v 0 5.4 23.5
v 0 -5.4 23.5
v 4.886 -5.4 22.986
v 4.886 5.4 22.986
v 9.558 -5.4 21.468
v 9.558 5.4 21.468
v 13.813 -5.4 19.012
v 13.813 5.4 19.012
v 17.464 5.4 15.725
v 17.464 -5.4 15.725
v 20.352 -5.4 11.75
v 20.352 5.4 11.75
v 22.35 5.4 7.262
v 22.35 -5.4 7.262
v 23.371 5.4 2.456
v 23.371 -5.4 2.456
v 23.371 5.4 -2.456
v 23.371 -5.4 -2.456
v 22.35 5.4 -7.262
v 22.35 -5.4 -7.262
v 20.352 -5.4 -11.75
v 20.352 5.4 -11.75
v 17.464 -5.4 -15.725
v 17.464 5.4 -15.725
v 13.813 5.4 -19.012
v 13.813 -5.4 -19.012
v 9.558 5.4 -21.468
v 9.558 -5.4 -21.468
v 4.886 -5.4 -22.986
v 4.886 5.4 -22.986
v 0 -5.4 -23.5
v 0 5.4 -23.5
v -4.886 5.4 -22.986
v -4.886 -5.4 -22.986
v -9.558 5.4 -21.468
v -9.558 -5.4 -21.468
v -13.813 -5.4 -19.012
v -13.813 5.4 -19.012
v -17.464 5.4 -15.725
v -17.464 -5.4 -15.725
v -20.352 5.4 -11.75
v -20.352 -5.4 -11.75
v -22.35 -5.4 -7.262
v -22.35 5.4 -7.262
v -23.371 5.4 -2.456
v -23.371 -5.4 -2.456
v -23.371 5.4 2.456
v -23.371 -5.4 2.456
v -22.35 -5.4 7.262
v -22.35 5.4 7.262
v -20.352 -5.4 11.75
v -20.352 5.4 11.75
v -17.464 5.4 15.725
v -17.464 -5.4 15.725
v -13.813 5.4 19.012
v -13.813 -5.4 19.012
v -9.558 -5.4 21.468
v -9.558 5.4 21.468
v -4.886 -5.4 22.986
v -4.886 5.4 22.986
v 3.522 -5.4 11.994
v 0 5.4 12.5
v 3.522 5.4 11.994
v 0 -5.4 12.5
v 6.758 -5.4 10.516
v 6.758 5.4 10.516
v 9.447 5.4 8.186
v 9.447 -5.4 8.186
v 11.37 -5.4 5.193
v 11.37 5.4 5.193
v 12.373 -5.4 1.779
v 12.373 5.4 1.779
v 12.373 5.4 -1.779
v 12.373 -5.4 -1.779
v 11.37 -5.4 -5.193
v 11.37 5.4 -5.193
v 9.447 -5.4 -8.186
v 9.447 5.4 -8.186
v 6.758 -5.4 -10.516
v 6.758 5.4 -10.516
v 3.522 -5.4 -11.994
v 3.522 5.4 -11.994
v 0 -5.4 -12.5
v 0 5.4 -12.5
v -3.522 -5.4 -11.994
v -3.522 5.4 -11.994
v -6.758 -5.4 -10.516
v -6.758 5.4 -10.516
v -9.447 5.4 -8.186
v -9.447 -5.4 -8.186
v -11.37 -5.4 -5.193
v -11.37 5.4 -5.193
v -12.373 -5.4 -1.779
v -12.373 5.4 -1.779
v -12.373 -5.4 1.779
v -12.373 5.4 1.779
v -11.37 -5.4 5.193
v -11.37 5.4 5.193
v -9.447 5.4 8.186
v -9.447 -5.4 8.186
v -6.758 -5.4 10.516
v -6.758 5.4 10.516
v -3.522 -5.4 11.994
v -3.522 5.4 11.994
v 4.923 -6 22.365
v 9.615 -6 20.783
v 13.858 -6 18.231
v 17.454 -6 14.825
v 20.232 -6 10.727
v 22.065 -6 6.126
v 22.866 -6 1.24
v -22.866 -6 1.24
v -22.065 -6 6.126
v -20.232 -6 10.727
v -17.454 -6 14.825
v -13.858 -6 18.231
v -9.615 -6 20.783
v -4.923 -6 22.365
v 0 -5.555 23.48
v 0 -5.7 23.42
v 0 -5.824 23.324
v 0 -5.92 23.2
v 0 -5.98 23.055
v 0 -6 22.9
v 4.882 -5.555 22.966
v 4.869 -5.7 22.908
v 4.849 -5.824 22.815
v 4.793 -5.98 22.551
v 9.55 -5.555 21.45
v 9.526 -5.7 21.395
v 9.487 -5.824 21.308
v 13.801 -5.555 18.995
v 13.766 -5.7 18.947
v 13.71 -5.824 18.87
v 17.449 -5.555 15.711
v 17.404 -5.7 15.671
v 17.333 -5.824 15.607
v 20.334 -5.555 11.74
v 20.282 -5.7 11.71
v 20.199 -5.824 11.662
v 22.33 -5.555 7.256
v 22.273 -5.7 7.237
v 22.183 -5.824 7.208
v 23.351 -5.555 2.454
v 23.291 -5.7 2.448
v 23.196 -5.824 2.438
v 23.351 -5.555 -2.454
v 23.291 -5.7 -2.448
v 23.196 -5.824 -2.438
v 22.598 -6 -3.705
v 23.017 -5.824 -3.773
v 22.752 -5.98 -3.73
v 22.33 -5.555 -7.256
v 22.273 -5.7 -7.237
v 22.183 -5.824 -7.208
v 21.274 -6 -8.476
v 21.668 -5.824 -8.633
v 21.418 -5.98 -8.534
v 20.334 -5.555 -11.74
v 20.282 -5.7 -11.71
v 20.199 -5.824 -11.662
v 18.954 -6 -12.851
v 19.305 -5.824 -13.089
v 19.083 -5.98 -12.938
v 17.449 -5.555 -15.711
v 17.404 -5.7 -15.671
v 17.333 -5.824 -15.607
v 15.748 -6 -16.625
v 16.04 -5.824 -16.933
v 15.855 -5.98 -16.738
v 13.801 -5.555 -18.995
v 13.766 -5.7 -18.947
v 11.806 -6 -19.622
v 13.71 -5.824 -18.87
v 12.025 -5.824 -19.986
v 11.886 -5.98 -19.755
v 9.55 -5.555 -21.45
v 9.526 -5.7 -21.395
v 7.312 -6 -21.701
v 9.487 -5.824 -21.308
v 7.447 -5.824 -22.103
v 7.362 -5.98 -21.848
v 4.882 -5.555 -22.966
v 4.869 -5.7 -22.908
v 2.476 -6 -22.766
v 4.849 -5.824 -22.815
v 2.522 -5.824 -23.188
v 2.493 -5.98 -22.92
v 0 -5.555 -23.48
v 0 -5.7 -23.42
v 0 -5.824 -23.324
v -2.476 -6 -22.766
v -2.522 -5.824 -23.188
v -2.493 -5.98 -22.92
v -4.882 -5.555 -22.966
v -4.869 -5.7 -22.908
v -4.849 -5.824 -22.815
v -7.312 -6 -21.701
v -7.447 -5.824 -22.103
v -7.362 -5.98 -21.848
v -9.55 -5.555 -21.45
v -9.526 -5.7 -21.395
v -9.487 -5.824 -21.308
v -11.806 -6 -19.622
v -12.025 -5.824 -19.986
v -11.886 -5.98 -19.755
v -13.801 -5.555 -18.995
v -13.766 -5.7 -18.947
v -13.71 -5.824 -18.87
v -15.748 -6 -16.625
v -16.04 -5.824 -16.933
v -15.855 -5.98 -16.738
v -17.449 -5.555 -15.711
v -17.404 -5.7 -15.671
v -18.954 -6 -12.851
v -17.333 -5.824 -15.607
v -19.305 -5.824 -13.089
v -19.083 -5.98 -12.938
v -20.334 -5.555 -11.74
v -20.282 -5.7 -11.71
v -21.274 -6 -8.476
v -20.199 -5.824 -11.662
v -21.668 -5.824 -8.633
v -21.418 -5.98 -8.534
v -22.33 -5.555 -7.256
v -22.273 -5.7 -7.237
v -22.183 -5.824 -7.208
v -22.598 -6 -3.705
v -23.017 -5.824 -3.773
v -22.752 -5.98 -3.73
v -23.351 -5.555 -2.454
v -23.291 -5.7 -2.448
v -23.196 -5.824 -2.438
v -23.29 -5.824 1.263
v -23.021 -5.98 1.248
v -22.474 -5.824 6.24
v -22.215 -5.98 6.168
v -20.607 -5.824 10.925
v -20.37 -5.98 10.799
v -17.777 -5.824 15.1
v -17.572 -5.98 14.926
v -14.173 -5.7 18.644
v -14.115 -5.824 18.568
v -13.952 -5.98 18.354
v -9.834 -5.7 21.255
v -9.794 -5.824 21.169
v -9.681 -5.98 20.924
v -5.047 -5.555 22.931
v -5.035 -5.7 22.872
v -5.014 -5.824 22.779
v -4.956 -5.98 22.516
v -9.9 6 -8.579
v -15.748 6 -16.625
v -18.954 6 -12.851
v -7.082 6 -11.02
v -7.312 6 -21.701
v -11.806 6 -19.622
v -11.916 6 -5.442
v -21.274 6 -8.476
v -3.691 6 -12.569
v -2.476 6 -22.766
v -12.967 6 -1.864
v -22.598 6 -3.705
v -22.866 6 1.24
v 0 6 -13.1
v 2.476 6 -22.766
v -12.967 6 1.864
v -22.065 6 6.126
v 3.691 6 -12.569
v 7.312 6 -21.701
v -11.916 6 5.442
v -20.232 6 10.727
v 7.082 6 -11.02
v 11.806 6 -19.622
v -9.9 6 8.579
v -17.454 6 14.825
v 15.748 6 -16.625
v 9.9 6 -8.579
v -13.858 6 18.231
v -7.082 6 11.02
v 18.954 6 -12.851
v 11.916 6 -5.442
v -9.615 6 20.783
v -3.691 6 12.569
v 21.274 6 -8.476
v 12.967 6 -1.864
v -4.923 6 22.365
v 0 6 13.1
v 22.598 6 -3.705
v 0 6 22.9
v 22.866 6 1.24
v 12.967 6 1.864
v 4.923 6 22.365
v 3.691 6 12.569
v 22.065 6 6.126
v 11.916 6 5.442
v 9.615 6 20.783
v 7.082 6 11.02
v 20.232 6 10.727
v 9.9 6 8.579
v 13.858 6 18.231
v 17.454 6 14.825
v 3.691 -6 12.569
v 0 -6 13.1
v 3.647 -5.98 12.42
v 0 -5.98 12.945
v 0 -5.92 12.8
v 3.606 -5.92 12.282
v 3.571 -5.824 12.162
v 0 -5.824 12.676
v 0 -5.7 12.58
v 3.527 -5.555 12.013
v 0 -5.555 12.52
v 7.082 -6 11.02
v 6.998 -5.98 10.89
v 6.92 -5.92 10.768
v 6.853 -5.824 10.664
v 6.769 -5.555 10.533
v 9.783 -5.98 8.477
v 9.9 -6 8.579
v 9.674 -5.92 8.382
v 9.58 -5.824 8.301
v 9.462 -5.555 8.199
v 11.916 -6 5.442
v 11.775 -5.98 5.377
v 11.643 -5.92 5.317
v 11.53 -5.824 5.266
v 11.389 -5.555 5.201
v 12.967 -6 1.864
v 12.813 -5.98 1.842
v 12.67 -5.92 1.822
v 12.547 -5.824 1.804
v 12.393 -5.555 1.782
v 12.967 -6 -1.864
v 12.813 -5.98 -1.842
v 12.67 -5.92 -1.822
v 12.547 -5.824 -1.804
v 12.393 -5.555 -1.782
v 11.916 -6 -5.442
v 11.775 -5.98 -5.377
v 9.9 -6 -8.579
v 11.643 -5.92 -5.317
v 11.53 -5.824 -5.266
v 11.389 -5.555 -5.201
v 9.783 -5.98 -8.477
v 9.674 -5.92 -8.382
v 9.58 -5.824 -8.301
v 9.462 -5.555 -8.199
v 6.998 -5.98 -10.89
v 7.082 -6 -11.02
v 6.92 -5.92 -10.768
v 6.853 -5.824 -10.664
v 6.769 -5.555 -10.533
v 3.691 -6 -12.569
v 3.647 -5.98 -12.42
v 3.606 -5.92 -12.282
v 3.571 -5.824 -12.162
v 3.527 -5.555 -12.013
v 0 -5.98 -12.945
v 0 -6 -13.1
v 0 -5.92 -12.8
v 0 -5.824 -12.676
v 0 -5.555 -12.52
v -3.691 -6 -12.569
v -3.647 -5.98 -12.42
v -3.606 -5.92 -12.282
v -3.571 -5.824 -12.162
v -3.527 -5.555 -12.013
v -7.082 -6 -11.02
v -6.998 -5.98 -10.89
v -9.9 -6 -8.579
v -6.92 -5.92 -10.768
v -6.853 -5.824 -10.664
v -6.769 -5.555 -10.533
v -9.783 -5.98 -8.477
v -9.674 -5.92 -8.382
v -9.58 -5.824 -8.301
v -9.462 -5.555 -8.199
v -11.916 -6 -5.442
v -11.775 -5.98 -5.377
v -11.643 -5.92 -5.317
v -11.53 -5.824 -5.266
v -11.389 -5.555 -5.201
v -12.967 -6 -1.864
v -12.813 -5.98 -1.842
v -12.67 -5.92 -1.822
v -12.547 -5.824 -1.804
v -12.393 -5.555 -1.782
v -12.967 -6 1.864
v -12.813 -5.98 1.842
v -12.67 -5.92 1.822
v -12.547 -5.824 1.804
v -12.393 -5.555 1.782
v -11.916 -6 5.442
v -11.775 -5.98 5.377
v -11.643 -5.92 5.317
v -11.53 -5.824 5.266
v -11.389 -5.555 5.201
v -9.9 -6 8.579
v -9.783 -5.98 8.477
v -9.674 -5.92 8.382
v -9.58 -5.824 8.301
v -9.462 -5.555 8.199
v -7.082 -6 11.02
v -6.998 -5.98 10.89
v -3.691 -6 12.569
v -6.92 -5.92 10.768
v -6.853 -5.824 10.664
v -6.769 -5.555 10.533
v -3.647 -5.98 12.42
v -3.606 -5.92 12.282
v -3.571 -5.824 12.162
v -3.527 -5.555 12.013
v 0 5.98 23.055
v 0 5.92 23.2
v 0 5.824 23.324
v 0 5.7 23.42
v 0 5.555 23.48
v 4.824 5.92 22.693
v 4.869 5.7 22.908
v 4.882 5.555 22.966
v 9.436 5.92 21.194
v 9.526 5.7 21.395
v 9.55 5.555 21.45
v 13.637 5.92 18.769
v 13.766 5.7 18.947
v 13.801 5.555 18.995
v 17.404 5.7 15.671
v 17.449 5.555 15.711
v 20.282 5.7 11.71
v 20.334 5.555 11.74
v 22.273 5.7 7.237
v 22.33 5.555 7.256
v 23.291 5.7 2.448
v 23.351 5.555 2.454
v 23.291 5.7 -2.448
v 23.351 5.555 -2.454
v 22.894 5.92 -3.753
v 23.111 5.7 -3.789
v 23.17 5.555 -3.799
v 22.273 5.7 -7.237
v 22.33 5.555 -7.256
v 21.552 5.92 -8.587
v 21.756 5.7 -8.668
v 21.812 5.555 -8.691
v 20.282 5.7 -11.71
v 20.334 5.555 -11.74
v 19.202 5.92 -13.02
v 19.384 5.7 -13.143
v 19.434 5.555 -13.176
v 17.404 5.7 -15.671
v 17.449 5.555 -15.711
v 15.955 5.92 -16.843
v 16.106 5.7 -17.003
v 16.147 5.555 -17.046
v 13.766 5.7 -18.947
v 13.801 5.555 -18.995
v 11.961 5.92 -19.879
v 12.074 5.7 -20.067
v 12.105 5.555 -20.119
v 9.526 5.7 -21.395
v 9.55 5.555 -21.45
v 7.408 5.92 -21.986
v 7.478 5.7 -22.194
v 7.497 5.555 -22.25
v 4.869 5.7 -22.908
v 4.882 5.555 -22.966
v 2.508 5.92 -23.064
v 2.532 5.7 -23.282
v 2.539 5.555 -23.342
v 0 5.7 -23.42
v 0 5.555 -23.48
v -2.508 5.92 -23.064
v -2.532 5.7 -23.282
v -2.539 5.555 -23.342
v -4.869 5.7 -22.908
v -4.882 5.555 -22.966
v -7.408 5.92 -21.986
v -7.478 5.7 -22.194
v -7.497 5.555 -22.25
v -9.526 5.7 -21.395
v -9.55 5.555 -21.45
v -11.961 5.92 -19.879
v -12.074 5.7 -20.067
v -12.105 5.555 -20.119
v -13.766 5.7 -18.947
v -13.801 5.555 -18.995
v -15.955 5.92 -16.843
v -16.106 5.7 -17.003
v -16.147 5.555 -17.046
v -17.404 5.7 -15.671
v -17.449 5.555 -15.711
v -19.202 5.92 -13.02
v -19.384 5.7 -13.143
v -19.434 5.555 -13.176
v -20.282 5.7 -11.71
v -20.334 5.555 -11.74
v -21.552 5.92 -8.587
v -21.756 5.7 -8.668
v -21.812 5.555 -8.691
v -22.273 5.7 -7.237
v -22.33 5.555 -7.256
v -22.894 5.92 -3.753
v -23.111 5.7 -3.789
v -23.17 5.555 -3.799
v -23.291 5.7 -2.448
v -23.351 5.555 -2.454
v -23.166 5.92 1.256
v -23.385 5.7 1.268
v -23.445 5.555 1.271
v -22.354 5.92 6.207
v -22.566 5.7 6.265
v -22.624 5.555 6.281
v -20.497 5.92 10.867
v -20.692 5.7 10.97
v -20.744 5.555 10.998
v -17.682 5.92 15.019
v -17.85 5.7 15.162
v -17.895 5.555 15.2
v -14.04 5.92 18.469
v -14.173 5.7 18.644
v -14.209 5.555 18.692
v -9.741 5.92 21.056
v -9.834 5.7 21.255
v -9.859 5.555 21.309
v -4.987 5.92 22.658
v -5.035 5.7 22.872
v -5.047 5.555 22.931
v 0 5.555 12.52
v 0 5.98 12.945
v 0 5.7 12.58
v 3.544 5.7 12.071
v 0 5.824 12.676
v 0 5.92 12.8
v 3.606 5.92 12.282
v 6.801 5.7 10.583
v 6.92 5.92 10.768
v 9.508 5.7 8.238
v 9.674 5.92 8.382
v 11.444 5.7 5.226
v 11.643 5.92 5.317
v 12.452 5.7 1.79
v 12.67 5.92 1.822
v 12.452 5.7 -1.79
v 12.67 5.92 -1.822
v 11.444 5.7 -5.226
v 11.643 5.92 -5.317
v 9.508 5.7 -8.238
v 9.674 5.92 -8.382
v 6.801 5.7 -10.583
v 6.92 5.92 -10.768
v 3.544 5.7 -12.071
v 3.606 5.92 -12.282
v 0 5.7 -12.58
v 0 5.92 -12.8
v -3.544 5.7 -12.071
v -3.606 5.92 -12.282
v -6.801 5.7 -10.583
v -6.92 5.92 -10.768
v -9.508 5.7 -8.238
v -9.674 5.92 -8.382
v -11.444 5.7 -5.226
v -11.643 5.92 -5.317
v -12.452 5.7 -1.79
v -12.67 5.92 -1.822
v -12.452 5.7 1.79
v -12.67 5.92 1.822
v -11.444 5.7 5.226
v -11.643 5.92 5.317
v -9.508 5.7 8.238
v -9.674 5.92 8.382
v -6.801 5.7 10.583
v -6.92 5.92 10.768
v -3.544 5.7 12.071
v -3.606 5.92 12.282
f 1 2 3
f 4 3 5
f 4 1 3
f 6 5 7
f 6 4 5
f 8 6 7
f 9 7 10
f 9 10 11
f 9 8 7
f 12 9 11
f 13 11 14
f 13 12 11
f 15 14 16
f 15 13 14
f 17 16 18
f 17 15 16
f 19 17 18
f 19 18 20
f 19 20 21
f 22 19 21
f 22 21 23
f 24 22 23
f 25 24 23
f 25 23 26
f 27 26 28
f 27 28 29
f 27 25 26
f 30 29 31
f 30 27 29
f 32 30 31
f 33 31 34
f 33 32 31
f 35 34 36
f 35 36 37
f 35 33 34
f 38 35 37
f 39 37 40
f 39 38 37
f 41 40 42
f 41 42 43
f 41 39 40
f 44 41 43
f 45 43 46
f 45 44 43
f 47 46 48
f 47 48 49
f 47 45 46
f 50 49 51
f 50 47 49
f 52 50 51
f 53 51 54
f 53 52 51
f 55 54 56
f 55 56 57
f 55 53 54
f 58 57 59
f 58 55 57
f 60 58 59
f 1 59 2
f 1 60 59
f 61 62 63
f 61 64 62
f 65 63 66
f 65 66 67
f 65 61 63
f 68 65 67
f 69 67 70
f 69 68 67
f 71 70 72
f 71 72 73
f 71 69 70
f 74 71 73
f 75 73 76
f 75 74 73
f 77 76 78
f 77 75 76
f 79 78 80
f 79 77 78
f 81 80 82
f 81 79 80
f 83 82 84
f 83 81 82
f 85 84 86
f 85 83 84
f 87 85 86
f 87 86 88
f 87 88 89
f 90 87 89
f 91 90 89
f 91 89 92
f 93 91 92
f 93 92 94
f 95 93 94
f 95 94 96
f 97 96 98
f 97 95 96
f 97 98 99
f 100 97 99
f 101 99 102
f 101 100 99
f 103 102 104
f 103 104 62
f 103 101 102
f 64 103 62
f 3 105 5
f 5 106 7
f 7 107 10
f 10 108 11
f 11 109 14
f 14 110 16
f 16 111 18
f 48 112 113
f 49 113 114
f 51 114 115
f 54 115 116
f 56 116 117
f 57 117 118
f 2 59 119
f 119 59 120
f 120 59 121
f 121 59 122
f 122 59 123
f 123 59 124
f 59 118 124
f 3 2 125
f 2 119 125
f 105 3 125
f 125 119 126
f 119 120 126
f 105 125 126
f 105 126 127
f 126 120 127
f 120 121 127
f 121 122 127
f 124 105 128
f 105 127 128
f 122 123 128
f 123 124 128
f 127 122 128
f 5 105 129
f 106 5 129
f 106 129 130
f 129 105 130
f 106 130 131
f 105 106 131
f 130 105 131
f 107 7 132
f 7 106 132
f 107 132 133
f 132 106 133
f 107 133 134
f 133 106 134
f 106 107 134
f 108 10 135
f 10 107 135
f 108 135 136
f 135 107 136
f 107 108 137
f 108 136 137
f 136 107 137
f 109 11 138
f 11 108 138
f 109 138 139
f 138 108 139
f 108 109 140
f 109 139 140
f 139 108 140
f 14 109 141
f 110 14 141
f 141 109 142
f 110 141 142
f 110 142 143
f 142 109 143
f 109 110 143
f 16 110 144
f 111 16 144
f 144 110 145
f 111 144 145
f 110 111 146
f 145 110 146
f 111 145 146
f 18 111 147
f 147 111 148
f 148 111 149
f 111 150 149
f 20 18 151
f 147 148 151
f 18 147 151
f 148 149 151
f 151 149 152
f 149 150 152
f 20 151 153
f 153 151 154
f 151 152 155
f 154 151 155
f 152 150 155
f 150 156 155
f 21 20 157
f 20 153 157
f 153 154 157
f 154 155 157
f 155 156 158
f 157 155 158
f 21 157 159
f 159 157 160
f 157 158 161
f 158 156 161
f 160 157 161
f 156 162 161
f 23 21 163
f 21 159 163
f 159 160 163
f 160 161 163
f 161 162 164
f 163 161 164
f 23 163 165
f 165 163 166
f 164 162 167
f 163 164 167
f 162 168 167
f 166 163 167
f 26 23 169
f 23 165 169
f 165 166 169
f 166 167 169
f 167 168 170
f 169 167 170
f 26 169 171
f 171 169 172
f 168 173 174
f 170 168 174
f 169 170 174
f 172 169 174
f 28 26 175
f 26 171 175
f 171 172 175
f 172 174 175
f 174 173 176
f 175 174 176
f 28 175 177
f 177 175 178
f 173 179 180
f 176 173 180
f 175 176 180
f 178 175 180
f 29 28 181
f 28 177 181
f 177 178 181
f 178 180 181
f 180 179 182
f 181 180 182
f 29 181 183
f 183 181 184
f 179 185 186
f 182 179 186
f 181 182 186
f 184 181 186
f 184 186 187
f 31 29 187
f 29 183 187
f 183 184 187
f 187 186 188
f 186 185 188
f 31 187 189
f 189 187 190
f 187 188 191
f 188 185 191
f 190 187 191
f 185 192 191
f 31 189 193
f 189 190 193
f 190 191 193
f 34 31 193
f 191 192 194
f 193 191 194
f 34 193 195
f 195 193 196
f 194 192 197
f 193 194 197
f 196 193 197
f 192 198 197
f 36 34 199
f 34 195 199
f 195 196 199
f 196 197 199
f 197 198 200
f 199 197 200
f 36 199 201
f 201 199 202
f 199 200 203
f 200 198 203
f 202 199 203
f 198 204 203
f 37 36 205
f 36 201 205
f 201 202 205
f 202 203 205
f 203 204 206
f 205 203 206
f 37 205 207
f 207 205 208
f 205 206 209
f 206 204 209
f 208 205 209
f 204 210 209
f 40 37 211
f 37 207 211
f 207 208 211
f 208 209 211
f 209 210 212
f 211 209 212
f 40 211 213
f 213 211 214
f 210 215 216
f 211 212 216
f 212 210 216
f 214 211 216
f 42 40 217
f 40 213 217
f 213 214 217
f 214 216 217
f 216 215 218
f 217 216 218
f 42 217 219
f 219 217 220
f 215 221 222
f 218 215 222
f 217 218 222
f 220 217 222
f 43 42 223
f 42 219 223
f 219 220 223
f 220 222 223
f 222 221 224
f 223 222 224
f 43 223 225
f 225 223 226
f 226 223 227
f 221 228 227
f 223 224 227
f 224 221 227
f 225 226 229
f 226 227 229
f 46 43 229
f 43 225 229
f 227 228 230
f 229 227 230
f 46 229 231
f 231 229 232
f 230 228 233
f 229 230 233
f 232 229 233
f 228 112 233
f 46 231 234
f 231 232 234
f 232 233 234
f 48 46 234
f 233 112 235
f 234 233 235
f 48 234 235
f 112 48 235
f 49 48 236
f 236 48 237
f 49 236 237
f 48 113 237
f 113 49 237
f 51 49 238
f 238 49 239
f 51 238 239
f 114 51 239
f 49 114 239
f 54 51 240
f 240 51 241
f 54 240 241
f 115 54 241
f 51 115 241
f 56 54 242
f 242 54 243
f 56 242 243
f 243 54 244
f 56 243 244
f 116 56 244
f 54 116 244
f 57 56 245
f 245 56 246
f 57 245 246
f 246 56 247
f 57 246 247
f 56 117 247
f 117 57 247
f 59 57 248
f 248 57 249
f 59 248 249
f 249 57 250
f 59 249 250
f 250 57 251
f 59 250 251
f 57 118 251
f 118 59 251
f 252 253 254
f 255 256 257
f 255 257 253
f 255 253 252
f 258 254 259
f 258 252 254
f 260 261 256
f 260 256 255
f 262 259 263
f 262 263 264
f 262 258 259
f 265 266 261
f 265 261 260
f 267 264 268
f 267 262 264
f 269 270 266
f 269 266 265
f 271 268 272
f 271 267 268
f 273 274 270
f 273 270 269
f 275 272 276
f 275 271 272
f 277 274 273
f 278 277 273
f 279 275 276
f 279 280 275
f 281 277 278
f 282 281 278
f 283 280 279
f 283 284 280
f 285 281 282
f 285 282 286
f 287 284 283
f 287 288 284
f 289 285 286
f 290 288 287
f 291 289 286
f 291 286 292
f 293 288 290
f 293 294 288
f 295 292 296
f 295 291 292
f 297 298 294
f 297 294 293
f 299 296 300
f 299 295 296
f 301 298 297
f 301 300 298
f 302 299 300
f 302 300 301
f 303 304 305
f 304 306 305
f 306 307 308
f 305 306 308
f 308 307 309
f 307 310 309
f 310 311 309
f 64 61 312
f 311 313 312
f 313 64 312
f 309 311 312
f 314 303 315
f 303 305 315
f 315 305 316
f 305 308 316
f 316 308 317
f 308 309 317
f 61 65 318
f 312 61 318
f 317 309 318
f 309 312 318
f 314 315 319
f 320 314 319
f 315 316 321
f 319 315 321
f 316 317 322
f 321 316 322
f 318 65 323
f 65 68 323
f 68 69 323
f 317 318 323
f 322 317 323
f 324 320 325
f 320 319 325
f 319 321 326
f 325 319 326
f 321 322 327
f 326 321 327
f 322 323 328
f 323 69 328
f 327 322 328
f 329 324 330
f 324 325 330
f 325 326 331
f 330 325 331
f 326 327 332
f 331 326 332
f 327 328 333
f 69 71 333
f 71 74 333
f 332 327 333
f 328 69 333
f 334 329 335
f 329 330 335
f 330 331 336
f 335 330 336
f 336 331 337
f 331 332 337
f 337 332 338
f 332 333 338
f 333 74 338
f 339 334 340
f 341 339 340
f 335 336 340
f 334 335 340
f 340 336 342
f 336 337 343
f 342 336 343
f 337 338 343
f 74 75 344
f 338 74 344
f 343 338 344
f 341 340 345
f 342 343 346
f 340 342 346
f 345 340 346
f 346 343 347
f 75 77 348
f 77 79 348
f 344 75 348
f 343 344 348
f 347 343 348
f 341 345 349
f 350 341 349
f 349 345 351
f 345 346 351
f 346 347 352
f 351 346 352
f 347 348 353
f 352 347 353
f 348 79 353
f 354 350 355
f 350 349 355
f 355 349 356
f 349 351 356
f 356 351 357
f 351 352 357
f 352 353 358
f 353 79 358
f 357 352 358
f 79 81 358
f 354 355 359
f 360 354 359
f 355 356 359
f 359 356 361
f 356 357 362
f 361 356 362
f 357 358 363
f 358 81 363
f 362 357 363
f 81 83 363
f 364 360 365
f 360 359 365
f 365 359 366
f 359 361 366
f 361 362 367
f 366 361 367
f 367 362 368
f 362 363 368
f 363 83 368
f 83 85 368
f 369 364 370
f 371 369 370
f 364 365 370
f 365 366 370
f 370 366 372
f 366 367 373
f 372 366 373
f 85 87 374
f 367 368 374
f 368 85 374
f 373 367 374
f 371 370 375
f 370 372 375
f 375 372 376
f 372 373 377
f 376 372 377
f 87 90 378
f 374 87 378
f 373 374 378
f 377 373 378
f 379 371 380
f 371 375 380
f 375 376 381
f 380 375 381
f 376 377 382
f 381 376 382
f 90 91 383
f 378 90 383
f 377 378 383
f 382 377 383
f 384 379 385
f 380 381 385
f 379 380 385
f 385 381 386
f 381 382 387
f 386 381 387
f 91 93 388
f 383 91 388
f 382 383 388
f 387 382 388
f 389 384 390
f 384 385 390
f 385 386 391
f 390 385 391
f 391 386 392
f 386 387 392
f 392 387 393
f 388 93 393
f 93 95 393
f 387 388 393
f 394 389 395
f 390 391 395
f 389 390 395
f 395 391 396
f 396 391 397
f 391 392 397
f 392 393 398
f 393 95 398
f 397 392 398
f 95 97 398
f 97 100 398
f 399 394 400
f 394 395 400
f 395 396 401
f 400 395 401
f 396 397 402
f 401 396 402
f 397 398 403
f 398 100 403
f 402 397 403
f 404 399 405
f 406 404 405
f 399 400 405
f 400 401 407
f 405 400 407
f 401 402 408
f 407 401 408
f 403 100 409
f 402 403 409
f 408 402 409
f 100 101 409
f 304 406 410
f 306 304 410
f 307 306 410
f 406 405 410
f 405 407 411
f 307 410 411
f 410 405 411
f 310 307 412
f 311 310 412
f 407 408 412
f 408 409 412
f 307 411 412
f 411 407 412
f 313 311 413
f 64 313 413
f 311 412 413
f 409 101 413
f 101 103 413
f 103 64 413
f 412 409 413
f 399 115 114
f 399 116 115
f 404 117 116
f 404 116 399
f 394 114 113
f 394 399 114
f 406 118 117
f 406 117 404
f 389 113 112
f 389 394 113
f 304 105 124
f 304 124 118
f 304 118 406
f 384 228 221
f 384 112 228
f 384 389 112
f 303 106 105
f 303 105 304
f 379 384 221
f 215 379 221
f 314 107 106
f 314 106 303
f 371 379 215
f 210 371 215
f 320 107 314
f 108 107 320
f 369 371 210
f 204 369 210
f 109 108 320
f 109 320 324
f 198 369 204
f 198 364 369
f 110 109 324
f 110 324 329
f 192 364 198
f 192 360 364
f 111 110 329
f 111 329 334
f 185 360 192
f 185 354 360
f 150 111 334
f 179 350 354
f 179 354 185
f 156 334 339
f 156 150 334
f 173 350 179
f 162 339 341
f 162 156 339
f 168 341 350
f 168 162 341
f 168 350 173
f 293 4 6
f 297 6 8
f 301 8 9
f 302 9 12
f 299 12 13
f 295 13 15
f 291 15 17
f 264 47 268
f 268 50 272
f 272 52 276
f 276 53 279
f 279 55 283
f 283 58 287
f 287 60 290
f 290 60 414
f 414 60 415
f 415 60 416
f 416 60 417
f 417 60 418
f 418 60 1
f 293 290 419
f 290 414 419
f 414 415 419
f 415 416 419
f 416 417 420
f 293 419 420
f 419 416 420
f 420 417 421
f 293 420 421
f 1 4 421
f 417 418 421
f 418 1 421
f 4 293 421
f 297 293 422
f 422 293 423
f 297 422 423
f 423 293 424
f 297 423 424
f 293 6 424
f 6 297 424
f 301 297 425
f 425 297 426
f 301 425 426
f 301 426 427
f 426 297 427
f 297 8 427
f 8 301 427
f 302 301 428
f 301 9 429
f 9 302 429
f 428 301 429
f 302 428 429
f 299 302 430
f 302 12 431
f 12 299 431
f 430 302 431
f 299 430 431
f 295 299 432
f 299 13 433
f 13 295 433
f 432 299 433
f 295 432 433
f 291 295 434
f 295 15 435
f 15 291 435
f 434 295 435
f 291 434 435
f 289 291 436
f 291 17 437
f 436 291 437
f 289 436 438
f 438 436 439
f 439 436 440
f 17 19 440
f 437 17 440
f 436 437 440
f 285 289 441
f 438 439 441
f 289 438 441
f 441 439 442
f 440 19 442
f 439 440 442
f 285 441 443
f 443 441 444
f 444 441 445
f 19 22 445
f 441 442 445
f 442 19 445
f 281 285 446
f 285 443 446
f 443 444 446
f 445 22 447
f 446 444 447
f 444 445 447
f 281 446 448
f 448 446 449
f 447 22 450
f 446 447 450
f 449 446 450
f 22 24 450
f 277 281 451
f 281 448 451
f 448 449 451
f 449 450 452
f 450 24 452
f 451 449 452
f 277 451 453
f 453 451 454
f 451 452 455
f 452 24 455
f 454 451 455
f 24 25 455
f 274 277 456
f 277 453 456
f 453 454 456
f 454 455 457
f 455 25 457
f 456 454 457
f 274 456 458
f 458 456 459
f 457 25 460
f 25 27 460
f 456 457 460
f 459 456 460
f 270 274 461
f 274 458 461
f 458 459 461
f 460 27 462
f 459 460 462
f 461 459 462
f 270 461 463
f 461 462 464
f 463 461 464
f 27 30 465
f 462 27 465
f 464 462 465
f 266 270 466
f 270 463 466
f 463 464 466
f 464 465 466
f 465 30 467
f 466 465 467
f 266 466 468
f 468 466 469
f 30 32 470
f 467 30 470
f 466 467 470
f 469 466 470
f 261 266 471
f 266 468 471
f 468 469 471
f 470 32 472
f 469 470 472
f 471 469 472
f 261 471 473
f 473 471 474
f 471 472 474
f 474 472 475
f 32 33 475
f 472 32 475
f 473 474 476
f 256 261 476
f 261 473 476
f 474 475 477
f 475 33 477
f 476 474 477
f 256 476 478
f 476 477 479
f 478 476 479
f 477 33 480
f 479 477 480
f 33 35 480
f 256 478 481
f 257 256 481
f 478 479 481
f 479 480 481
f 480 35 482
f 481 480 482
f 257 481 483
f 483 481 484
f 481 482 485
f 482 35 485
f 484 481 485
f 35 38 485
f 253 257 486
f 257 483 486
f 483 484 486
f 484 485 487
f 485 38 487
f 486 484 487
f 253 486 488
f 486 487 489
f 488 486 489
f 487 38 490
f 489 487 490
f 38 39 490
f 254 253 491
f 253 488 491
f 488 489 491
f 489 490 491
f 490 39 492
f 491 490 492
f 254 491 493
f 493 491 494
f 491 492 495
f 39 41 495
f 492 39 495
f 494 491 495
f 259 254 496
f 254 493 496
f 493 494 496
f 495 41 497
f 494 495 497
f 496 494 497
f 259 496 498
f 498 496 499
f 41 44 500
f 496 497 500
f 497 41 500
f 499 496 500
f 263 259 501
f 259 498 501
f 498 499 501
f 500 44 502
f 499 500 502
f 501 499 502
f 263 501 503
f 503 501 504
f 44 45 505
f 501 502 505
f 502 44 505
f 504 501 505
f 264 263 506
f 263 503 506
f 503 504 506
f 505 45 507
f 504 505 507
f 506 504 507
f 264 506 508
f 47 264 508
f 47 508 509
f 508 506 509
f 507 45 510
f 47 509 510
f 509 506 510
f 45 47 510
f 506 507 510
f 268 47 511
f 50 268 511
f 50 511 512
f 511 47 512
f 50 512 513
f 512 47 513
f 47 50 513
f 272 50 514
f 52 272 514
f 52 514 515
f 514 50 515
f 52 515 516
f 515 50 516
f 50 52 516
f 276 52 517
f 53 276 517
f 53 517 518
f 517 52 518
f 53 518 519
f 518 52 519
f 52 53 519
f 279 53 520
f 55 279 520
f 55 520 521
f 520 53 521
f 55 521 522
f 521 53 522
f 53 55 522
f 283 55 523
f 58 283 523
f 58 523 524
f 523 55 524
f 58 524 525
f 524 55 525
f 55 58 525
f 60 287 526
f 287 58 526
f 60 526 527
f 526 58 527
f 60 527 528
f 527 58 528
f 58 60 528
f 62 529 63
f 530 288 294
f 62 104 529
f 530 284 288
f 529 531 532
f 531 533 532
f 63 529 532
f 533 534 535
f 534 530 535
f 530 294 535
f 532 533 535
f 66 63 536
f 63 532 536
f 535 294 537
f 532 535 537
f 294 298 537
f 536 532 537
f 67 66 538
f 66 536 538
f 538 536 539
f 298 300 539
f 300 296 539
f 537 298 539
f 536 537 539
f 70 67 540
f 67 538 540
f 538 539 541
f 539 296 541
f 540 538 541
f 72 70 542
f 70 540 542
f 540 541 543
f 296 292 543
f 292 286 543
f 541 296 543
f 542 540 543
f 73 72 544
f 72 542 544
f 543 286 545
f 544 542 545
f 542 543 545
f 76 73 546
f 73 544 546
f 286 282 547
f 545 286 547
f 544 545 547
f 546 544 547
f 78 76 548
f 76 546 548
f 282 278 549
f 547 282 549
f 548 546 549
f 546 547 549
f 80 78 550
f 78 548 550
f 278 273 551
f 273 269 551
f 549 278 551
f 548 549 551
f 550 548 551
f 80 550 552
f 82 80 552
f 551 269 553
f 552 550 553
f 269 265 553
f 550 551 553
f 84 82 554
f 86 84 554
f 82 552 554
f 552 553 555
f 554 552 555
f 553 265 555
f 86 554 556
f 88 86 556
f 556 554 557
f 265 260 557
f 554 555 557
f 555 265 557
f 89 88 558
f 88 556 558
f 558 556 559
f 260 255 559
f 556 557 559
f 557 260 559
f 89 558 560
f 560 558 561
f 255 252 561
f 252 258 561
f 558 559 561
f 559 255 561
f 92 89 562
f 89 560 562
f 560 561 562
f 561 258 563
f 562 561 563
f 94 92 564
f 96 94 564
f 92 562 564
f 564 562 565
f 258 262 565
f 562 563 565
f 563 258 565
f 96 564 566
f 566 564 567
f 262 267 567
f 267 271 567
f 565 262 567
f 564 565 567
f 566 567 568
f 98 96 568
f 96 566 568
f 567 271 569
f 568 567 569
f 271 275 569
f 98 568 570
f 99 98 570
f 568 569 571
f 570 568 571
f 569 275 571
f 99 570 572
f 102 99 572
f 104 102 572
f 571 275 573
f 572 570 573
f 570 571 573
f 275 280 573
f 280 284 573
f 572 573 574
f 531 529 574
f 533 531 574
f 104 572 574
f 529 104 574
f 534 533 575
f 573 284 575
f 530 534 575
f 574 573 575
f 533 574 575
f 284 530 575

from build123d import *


with BuildPart() as part:
    # Sketch → Revolution (revolve)
    with BuildSketch(Plane.YZ):
        with BuildLine():
            ThreePointArc((-5.4, 23.5), (-5.824264, 23.324264), (-6, 22.9))
            Line((-6, 13.1), (-6, 22.9))
            ThreePointArc((-6, 13.1), (-5.824264, 12.675736), (-5.4, 12.5))
            Line((5.4, 12.5), (-5.4, 12.5))
            ThreePointArc((5.4, 12.5), (5.824264, 12.675736), (6, 13.1))
            Line((6, 22.9), (6, 13.1))
            ThreePointArc((6, 22.9), (5.824264, 23.324264), (5.4, 23.5))
            Line((-5.4, 23.5), (5.4, 23.5))
        make_face()
    revolve(axis=Axis((0, 0, 0), (0, 1, 0)))


solid = part.part
